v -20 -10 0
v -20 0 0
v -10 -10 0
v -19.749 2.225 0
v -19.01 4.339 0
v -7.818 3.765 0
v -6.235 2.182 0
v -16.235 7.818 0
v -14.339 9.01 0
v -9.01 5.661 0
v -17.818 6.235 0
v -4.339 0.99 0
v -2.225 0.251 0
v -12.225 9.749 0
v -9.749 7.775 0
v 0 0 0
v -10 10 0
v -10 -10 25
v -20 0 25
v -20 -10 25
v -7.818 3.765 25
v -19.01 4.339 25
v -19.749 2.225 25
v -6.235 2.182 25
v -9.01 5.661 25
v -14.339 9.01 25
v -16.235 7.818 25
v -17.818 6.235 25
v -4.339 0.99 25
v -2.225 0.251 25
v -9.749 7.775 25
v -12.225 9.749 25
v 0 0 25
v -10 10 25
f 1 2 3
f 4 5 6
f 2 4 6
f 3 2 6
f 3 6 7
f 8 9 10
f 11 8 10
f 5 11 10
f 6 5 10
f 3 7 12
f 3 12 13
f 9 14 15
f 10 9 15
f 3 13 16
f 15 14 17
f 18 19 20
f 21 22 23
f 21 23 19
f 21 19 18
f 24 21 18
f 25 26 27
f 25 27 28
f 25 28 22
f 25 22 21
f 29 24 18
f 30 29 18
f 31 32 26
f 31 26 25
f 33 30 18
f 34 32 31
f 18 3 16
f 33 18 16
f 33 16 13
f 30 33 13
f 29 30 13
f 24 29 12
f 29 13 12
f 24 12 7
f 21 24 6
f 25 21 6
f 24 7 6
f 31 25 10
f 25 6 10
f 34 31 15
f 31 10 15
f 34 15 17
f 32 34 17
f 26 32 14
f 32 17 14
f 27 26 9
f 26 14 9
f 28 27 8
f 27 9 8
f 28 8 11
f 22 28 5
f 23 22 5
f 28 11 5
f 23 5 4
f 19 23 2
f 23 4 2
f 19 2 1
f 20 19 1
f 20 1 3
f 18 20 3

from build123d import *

# Parameters (mm, degrees)
BOSS_EXTRUDE1_DEPTH = 25


with BuildPart() as part:
    # Sketch1 → Boss-Extrude1 (new body)
    with BuildSketch(Plane.XY):
        with BuildLine():
            Line((-20, 0), (-20, -10))
            Line((-20, -10), (-10, -10))
            Line((-10, -10), (0, 0))
            ThreePointArc((0, 0), (-7.071067812, 2.928932188), (-10, 10))
            ThreePointArc((-10, 10), (-17.071067812, 7.071067812), (-20, 0))
        make_face()
    extrude(amount=BOSS_EXTRUDE1_DEPTH)


solid = part.part
